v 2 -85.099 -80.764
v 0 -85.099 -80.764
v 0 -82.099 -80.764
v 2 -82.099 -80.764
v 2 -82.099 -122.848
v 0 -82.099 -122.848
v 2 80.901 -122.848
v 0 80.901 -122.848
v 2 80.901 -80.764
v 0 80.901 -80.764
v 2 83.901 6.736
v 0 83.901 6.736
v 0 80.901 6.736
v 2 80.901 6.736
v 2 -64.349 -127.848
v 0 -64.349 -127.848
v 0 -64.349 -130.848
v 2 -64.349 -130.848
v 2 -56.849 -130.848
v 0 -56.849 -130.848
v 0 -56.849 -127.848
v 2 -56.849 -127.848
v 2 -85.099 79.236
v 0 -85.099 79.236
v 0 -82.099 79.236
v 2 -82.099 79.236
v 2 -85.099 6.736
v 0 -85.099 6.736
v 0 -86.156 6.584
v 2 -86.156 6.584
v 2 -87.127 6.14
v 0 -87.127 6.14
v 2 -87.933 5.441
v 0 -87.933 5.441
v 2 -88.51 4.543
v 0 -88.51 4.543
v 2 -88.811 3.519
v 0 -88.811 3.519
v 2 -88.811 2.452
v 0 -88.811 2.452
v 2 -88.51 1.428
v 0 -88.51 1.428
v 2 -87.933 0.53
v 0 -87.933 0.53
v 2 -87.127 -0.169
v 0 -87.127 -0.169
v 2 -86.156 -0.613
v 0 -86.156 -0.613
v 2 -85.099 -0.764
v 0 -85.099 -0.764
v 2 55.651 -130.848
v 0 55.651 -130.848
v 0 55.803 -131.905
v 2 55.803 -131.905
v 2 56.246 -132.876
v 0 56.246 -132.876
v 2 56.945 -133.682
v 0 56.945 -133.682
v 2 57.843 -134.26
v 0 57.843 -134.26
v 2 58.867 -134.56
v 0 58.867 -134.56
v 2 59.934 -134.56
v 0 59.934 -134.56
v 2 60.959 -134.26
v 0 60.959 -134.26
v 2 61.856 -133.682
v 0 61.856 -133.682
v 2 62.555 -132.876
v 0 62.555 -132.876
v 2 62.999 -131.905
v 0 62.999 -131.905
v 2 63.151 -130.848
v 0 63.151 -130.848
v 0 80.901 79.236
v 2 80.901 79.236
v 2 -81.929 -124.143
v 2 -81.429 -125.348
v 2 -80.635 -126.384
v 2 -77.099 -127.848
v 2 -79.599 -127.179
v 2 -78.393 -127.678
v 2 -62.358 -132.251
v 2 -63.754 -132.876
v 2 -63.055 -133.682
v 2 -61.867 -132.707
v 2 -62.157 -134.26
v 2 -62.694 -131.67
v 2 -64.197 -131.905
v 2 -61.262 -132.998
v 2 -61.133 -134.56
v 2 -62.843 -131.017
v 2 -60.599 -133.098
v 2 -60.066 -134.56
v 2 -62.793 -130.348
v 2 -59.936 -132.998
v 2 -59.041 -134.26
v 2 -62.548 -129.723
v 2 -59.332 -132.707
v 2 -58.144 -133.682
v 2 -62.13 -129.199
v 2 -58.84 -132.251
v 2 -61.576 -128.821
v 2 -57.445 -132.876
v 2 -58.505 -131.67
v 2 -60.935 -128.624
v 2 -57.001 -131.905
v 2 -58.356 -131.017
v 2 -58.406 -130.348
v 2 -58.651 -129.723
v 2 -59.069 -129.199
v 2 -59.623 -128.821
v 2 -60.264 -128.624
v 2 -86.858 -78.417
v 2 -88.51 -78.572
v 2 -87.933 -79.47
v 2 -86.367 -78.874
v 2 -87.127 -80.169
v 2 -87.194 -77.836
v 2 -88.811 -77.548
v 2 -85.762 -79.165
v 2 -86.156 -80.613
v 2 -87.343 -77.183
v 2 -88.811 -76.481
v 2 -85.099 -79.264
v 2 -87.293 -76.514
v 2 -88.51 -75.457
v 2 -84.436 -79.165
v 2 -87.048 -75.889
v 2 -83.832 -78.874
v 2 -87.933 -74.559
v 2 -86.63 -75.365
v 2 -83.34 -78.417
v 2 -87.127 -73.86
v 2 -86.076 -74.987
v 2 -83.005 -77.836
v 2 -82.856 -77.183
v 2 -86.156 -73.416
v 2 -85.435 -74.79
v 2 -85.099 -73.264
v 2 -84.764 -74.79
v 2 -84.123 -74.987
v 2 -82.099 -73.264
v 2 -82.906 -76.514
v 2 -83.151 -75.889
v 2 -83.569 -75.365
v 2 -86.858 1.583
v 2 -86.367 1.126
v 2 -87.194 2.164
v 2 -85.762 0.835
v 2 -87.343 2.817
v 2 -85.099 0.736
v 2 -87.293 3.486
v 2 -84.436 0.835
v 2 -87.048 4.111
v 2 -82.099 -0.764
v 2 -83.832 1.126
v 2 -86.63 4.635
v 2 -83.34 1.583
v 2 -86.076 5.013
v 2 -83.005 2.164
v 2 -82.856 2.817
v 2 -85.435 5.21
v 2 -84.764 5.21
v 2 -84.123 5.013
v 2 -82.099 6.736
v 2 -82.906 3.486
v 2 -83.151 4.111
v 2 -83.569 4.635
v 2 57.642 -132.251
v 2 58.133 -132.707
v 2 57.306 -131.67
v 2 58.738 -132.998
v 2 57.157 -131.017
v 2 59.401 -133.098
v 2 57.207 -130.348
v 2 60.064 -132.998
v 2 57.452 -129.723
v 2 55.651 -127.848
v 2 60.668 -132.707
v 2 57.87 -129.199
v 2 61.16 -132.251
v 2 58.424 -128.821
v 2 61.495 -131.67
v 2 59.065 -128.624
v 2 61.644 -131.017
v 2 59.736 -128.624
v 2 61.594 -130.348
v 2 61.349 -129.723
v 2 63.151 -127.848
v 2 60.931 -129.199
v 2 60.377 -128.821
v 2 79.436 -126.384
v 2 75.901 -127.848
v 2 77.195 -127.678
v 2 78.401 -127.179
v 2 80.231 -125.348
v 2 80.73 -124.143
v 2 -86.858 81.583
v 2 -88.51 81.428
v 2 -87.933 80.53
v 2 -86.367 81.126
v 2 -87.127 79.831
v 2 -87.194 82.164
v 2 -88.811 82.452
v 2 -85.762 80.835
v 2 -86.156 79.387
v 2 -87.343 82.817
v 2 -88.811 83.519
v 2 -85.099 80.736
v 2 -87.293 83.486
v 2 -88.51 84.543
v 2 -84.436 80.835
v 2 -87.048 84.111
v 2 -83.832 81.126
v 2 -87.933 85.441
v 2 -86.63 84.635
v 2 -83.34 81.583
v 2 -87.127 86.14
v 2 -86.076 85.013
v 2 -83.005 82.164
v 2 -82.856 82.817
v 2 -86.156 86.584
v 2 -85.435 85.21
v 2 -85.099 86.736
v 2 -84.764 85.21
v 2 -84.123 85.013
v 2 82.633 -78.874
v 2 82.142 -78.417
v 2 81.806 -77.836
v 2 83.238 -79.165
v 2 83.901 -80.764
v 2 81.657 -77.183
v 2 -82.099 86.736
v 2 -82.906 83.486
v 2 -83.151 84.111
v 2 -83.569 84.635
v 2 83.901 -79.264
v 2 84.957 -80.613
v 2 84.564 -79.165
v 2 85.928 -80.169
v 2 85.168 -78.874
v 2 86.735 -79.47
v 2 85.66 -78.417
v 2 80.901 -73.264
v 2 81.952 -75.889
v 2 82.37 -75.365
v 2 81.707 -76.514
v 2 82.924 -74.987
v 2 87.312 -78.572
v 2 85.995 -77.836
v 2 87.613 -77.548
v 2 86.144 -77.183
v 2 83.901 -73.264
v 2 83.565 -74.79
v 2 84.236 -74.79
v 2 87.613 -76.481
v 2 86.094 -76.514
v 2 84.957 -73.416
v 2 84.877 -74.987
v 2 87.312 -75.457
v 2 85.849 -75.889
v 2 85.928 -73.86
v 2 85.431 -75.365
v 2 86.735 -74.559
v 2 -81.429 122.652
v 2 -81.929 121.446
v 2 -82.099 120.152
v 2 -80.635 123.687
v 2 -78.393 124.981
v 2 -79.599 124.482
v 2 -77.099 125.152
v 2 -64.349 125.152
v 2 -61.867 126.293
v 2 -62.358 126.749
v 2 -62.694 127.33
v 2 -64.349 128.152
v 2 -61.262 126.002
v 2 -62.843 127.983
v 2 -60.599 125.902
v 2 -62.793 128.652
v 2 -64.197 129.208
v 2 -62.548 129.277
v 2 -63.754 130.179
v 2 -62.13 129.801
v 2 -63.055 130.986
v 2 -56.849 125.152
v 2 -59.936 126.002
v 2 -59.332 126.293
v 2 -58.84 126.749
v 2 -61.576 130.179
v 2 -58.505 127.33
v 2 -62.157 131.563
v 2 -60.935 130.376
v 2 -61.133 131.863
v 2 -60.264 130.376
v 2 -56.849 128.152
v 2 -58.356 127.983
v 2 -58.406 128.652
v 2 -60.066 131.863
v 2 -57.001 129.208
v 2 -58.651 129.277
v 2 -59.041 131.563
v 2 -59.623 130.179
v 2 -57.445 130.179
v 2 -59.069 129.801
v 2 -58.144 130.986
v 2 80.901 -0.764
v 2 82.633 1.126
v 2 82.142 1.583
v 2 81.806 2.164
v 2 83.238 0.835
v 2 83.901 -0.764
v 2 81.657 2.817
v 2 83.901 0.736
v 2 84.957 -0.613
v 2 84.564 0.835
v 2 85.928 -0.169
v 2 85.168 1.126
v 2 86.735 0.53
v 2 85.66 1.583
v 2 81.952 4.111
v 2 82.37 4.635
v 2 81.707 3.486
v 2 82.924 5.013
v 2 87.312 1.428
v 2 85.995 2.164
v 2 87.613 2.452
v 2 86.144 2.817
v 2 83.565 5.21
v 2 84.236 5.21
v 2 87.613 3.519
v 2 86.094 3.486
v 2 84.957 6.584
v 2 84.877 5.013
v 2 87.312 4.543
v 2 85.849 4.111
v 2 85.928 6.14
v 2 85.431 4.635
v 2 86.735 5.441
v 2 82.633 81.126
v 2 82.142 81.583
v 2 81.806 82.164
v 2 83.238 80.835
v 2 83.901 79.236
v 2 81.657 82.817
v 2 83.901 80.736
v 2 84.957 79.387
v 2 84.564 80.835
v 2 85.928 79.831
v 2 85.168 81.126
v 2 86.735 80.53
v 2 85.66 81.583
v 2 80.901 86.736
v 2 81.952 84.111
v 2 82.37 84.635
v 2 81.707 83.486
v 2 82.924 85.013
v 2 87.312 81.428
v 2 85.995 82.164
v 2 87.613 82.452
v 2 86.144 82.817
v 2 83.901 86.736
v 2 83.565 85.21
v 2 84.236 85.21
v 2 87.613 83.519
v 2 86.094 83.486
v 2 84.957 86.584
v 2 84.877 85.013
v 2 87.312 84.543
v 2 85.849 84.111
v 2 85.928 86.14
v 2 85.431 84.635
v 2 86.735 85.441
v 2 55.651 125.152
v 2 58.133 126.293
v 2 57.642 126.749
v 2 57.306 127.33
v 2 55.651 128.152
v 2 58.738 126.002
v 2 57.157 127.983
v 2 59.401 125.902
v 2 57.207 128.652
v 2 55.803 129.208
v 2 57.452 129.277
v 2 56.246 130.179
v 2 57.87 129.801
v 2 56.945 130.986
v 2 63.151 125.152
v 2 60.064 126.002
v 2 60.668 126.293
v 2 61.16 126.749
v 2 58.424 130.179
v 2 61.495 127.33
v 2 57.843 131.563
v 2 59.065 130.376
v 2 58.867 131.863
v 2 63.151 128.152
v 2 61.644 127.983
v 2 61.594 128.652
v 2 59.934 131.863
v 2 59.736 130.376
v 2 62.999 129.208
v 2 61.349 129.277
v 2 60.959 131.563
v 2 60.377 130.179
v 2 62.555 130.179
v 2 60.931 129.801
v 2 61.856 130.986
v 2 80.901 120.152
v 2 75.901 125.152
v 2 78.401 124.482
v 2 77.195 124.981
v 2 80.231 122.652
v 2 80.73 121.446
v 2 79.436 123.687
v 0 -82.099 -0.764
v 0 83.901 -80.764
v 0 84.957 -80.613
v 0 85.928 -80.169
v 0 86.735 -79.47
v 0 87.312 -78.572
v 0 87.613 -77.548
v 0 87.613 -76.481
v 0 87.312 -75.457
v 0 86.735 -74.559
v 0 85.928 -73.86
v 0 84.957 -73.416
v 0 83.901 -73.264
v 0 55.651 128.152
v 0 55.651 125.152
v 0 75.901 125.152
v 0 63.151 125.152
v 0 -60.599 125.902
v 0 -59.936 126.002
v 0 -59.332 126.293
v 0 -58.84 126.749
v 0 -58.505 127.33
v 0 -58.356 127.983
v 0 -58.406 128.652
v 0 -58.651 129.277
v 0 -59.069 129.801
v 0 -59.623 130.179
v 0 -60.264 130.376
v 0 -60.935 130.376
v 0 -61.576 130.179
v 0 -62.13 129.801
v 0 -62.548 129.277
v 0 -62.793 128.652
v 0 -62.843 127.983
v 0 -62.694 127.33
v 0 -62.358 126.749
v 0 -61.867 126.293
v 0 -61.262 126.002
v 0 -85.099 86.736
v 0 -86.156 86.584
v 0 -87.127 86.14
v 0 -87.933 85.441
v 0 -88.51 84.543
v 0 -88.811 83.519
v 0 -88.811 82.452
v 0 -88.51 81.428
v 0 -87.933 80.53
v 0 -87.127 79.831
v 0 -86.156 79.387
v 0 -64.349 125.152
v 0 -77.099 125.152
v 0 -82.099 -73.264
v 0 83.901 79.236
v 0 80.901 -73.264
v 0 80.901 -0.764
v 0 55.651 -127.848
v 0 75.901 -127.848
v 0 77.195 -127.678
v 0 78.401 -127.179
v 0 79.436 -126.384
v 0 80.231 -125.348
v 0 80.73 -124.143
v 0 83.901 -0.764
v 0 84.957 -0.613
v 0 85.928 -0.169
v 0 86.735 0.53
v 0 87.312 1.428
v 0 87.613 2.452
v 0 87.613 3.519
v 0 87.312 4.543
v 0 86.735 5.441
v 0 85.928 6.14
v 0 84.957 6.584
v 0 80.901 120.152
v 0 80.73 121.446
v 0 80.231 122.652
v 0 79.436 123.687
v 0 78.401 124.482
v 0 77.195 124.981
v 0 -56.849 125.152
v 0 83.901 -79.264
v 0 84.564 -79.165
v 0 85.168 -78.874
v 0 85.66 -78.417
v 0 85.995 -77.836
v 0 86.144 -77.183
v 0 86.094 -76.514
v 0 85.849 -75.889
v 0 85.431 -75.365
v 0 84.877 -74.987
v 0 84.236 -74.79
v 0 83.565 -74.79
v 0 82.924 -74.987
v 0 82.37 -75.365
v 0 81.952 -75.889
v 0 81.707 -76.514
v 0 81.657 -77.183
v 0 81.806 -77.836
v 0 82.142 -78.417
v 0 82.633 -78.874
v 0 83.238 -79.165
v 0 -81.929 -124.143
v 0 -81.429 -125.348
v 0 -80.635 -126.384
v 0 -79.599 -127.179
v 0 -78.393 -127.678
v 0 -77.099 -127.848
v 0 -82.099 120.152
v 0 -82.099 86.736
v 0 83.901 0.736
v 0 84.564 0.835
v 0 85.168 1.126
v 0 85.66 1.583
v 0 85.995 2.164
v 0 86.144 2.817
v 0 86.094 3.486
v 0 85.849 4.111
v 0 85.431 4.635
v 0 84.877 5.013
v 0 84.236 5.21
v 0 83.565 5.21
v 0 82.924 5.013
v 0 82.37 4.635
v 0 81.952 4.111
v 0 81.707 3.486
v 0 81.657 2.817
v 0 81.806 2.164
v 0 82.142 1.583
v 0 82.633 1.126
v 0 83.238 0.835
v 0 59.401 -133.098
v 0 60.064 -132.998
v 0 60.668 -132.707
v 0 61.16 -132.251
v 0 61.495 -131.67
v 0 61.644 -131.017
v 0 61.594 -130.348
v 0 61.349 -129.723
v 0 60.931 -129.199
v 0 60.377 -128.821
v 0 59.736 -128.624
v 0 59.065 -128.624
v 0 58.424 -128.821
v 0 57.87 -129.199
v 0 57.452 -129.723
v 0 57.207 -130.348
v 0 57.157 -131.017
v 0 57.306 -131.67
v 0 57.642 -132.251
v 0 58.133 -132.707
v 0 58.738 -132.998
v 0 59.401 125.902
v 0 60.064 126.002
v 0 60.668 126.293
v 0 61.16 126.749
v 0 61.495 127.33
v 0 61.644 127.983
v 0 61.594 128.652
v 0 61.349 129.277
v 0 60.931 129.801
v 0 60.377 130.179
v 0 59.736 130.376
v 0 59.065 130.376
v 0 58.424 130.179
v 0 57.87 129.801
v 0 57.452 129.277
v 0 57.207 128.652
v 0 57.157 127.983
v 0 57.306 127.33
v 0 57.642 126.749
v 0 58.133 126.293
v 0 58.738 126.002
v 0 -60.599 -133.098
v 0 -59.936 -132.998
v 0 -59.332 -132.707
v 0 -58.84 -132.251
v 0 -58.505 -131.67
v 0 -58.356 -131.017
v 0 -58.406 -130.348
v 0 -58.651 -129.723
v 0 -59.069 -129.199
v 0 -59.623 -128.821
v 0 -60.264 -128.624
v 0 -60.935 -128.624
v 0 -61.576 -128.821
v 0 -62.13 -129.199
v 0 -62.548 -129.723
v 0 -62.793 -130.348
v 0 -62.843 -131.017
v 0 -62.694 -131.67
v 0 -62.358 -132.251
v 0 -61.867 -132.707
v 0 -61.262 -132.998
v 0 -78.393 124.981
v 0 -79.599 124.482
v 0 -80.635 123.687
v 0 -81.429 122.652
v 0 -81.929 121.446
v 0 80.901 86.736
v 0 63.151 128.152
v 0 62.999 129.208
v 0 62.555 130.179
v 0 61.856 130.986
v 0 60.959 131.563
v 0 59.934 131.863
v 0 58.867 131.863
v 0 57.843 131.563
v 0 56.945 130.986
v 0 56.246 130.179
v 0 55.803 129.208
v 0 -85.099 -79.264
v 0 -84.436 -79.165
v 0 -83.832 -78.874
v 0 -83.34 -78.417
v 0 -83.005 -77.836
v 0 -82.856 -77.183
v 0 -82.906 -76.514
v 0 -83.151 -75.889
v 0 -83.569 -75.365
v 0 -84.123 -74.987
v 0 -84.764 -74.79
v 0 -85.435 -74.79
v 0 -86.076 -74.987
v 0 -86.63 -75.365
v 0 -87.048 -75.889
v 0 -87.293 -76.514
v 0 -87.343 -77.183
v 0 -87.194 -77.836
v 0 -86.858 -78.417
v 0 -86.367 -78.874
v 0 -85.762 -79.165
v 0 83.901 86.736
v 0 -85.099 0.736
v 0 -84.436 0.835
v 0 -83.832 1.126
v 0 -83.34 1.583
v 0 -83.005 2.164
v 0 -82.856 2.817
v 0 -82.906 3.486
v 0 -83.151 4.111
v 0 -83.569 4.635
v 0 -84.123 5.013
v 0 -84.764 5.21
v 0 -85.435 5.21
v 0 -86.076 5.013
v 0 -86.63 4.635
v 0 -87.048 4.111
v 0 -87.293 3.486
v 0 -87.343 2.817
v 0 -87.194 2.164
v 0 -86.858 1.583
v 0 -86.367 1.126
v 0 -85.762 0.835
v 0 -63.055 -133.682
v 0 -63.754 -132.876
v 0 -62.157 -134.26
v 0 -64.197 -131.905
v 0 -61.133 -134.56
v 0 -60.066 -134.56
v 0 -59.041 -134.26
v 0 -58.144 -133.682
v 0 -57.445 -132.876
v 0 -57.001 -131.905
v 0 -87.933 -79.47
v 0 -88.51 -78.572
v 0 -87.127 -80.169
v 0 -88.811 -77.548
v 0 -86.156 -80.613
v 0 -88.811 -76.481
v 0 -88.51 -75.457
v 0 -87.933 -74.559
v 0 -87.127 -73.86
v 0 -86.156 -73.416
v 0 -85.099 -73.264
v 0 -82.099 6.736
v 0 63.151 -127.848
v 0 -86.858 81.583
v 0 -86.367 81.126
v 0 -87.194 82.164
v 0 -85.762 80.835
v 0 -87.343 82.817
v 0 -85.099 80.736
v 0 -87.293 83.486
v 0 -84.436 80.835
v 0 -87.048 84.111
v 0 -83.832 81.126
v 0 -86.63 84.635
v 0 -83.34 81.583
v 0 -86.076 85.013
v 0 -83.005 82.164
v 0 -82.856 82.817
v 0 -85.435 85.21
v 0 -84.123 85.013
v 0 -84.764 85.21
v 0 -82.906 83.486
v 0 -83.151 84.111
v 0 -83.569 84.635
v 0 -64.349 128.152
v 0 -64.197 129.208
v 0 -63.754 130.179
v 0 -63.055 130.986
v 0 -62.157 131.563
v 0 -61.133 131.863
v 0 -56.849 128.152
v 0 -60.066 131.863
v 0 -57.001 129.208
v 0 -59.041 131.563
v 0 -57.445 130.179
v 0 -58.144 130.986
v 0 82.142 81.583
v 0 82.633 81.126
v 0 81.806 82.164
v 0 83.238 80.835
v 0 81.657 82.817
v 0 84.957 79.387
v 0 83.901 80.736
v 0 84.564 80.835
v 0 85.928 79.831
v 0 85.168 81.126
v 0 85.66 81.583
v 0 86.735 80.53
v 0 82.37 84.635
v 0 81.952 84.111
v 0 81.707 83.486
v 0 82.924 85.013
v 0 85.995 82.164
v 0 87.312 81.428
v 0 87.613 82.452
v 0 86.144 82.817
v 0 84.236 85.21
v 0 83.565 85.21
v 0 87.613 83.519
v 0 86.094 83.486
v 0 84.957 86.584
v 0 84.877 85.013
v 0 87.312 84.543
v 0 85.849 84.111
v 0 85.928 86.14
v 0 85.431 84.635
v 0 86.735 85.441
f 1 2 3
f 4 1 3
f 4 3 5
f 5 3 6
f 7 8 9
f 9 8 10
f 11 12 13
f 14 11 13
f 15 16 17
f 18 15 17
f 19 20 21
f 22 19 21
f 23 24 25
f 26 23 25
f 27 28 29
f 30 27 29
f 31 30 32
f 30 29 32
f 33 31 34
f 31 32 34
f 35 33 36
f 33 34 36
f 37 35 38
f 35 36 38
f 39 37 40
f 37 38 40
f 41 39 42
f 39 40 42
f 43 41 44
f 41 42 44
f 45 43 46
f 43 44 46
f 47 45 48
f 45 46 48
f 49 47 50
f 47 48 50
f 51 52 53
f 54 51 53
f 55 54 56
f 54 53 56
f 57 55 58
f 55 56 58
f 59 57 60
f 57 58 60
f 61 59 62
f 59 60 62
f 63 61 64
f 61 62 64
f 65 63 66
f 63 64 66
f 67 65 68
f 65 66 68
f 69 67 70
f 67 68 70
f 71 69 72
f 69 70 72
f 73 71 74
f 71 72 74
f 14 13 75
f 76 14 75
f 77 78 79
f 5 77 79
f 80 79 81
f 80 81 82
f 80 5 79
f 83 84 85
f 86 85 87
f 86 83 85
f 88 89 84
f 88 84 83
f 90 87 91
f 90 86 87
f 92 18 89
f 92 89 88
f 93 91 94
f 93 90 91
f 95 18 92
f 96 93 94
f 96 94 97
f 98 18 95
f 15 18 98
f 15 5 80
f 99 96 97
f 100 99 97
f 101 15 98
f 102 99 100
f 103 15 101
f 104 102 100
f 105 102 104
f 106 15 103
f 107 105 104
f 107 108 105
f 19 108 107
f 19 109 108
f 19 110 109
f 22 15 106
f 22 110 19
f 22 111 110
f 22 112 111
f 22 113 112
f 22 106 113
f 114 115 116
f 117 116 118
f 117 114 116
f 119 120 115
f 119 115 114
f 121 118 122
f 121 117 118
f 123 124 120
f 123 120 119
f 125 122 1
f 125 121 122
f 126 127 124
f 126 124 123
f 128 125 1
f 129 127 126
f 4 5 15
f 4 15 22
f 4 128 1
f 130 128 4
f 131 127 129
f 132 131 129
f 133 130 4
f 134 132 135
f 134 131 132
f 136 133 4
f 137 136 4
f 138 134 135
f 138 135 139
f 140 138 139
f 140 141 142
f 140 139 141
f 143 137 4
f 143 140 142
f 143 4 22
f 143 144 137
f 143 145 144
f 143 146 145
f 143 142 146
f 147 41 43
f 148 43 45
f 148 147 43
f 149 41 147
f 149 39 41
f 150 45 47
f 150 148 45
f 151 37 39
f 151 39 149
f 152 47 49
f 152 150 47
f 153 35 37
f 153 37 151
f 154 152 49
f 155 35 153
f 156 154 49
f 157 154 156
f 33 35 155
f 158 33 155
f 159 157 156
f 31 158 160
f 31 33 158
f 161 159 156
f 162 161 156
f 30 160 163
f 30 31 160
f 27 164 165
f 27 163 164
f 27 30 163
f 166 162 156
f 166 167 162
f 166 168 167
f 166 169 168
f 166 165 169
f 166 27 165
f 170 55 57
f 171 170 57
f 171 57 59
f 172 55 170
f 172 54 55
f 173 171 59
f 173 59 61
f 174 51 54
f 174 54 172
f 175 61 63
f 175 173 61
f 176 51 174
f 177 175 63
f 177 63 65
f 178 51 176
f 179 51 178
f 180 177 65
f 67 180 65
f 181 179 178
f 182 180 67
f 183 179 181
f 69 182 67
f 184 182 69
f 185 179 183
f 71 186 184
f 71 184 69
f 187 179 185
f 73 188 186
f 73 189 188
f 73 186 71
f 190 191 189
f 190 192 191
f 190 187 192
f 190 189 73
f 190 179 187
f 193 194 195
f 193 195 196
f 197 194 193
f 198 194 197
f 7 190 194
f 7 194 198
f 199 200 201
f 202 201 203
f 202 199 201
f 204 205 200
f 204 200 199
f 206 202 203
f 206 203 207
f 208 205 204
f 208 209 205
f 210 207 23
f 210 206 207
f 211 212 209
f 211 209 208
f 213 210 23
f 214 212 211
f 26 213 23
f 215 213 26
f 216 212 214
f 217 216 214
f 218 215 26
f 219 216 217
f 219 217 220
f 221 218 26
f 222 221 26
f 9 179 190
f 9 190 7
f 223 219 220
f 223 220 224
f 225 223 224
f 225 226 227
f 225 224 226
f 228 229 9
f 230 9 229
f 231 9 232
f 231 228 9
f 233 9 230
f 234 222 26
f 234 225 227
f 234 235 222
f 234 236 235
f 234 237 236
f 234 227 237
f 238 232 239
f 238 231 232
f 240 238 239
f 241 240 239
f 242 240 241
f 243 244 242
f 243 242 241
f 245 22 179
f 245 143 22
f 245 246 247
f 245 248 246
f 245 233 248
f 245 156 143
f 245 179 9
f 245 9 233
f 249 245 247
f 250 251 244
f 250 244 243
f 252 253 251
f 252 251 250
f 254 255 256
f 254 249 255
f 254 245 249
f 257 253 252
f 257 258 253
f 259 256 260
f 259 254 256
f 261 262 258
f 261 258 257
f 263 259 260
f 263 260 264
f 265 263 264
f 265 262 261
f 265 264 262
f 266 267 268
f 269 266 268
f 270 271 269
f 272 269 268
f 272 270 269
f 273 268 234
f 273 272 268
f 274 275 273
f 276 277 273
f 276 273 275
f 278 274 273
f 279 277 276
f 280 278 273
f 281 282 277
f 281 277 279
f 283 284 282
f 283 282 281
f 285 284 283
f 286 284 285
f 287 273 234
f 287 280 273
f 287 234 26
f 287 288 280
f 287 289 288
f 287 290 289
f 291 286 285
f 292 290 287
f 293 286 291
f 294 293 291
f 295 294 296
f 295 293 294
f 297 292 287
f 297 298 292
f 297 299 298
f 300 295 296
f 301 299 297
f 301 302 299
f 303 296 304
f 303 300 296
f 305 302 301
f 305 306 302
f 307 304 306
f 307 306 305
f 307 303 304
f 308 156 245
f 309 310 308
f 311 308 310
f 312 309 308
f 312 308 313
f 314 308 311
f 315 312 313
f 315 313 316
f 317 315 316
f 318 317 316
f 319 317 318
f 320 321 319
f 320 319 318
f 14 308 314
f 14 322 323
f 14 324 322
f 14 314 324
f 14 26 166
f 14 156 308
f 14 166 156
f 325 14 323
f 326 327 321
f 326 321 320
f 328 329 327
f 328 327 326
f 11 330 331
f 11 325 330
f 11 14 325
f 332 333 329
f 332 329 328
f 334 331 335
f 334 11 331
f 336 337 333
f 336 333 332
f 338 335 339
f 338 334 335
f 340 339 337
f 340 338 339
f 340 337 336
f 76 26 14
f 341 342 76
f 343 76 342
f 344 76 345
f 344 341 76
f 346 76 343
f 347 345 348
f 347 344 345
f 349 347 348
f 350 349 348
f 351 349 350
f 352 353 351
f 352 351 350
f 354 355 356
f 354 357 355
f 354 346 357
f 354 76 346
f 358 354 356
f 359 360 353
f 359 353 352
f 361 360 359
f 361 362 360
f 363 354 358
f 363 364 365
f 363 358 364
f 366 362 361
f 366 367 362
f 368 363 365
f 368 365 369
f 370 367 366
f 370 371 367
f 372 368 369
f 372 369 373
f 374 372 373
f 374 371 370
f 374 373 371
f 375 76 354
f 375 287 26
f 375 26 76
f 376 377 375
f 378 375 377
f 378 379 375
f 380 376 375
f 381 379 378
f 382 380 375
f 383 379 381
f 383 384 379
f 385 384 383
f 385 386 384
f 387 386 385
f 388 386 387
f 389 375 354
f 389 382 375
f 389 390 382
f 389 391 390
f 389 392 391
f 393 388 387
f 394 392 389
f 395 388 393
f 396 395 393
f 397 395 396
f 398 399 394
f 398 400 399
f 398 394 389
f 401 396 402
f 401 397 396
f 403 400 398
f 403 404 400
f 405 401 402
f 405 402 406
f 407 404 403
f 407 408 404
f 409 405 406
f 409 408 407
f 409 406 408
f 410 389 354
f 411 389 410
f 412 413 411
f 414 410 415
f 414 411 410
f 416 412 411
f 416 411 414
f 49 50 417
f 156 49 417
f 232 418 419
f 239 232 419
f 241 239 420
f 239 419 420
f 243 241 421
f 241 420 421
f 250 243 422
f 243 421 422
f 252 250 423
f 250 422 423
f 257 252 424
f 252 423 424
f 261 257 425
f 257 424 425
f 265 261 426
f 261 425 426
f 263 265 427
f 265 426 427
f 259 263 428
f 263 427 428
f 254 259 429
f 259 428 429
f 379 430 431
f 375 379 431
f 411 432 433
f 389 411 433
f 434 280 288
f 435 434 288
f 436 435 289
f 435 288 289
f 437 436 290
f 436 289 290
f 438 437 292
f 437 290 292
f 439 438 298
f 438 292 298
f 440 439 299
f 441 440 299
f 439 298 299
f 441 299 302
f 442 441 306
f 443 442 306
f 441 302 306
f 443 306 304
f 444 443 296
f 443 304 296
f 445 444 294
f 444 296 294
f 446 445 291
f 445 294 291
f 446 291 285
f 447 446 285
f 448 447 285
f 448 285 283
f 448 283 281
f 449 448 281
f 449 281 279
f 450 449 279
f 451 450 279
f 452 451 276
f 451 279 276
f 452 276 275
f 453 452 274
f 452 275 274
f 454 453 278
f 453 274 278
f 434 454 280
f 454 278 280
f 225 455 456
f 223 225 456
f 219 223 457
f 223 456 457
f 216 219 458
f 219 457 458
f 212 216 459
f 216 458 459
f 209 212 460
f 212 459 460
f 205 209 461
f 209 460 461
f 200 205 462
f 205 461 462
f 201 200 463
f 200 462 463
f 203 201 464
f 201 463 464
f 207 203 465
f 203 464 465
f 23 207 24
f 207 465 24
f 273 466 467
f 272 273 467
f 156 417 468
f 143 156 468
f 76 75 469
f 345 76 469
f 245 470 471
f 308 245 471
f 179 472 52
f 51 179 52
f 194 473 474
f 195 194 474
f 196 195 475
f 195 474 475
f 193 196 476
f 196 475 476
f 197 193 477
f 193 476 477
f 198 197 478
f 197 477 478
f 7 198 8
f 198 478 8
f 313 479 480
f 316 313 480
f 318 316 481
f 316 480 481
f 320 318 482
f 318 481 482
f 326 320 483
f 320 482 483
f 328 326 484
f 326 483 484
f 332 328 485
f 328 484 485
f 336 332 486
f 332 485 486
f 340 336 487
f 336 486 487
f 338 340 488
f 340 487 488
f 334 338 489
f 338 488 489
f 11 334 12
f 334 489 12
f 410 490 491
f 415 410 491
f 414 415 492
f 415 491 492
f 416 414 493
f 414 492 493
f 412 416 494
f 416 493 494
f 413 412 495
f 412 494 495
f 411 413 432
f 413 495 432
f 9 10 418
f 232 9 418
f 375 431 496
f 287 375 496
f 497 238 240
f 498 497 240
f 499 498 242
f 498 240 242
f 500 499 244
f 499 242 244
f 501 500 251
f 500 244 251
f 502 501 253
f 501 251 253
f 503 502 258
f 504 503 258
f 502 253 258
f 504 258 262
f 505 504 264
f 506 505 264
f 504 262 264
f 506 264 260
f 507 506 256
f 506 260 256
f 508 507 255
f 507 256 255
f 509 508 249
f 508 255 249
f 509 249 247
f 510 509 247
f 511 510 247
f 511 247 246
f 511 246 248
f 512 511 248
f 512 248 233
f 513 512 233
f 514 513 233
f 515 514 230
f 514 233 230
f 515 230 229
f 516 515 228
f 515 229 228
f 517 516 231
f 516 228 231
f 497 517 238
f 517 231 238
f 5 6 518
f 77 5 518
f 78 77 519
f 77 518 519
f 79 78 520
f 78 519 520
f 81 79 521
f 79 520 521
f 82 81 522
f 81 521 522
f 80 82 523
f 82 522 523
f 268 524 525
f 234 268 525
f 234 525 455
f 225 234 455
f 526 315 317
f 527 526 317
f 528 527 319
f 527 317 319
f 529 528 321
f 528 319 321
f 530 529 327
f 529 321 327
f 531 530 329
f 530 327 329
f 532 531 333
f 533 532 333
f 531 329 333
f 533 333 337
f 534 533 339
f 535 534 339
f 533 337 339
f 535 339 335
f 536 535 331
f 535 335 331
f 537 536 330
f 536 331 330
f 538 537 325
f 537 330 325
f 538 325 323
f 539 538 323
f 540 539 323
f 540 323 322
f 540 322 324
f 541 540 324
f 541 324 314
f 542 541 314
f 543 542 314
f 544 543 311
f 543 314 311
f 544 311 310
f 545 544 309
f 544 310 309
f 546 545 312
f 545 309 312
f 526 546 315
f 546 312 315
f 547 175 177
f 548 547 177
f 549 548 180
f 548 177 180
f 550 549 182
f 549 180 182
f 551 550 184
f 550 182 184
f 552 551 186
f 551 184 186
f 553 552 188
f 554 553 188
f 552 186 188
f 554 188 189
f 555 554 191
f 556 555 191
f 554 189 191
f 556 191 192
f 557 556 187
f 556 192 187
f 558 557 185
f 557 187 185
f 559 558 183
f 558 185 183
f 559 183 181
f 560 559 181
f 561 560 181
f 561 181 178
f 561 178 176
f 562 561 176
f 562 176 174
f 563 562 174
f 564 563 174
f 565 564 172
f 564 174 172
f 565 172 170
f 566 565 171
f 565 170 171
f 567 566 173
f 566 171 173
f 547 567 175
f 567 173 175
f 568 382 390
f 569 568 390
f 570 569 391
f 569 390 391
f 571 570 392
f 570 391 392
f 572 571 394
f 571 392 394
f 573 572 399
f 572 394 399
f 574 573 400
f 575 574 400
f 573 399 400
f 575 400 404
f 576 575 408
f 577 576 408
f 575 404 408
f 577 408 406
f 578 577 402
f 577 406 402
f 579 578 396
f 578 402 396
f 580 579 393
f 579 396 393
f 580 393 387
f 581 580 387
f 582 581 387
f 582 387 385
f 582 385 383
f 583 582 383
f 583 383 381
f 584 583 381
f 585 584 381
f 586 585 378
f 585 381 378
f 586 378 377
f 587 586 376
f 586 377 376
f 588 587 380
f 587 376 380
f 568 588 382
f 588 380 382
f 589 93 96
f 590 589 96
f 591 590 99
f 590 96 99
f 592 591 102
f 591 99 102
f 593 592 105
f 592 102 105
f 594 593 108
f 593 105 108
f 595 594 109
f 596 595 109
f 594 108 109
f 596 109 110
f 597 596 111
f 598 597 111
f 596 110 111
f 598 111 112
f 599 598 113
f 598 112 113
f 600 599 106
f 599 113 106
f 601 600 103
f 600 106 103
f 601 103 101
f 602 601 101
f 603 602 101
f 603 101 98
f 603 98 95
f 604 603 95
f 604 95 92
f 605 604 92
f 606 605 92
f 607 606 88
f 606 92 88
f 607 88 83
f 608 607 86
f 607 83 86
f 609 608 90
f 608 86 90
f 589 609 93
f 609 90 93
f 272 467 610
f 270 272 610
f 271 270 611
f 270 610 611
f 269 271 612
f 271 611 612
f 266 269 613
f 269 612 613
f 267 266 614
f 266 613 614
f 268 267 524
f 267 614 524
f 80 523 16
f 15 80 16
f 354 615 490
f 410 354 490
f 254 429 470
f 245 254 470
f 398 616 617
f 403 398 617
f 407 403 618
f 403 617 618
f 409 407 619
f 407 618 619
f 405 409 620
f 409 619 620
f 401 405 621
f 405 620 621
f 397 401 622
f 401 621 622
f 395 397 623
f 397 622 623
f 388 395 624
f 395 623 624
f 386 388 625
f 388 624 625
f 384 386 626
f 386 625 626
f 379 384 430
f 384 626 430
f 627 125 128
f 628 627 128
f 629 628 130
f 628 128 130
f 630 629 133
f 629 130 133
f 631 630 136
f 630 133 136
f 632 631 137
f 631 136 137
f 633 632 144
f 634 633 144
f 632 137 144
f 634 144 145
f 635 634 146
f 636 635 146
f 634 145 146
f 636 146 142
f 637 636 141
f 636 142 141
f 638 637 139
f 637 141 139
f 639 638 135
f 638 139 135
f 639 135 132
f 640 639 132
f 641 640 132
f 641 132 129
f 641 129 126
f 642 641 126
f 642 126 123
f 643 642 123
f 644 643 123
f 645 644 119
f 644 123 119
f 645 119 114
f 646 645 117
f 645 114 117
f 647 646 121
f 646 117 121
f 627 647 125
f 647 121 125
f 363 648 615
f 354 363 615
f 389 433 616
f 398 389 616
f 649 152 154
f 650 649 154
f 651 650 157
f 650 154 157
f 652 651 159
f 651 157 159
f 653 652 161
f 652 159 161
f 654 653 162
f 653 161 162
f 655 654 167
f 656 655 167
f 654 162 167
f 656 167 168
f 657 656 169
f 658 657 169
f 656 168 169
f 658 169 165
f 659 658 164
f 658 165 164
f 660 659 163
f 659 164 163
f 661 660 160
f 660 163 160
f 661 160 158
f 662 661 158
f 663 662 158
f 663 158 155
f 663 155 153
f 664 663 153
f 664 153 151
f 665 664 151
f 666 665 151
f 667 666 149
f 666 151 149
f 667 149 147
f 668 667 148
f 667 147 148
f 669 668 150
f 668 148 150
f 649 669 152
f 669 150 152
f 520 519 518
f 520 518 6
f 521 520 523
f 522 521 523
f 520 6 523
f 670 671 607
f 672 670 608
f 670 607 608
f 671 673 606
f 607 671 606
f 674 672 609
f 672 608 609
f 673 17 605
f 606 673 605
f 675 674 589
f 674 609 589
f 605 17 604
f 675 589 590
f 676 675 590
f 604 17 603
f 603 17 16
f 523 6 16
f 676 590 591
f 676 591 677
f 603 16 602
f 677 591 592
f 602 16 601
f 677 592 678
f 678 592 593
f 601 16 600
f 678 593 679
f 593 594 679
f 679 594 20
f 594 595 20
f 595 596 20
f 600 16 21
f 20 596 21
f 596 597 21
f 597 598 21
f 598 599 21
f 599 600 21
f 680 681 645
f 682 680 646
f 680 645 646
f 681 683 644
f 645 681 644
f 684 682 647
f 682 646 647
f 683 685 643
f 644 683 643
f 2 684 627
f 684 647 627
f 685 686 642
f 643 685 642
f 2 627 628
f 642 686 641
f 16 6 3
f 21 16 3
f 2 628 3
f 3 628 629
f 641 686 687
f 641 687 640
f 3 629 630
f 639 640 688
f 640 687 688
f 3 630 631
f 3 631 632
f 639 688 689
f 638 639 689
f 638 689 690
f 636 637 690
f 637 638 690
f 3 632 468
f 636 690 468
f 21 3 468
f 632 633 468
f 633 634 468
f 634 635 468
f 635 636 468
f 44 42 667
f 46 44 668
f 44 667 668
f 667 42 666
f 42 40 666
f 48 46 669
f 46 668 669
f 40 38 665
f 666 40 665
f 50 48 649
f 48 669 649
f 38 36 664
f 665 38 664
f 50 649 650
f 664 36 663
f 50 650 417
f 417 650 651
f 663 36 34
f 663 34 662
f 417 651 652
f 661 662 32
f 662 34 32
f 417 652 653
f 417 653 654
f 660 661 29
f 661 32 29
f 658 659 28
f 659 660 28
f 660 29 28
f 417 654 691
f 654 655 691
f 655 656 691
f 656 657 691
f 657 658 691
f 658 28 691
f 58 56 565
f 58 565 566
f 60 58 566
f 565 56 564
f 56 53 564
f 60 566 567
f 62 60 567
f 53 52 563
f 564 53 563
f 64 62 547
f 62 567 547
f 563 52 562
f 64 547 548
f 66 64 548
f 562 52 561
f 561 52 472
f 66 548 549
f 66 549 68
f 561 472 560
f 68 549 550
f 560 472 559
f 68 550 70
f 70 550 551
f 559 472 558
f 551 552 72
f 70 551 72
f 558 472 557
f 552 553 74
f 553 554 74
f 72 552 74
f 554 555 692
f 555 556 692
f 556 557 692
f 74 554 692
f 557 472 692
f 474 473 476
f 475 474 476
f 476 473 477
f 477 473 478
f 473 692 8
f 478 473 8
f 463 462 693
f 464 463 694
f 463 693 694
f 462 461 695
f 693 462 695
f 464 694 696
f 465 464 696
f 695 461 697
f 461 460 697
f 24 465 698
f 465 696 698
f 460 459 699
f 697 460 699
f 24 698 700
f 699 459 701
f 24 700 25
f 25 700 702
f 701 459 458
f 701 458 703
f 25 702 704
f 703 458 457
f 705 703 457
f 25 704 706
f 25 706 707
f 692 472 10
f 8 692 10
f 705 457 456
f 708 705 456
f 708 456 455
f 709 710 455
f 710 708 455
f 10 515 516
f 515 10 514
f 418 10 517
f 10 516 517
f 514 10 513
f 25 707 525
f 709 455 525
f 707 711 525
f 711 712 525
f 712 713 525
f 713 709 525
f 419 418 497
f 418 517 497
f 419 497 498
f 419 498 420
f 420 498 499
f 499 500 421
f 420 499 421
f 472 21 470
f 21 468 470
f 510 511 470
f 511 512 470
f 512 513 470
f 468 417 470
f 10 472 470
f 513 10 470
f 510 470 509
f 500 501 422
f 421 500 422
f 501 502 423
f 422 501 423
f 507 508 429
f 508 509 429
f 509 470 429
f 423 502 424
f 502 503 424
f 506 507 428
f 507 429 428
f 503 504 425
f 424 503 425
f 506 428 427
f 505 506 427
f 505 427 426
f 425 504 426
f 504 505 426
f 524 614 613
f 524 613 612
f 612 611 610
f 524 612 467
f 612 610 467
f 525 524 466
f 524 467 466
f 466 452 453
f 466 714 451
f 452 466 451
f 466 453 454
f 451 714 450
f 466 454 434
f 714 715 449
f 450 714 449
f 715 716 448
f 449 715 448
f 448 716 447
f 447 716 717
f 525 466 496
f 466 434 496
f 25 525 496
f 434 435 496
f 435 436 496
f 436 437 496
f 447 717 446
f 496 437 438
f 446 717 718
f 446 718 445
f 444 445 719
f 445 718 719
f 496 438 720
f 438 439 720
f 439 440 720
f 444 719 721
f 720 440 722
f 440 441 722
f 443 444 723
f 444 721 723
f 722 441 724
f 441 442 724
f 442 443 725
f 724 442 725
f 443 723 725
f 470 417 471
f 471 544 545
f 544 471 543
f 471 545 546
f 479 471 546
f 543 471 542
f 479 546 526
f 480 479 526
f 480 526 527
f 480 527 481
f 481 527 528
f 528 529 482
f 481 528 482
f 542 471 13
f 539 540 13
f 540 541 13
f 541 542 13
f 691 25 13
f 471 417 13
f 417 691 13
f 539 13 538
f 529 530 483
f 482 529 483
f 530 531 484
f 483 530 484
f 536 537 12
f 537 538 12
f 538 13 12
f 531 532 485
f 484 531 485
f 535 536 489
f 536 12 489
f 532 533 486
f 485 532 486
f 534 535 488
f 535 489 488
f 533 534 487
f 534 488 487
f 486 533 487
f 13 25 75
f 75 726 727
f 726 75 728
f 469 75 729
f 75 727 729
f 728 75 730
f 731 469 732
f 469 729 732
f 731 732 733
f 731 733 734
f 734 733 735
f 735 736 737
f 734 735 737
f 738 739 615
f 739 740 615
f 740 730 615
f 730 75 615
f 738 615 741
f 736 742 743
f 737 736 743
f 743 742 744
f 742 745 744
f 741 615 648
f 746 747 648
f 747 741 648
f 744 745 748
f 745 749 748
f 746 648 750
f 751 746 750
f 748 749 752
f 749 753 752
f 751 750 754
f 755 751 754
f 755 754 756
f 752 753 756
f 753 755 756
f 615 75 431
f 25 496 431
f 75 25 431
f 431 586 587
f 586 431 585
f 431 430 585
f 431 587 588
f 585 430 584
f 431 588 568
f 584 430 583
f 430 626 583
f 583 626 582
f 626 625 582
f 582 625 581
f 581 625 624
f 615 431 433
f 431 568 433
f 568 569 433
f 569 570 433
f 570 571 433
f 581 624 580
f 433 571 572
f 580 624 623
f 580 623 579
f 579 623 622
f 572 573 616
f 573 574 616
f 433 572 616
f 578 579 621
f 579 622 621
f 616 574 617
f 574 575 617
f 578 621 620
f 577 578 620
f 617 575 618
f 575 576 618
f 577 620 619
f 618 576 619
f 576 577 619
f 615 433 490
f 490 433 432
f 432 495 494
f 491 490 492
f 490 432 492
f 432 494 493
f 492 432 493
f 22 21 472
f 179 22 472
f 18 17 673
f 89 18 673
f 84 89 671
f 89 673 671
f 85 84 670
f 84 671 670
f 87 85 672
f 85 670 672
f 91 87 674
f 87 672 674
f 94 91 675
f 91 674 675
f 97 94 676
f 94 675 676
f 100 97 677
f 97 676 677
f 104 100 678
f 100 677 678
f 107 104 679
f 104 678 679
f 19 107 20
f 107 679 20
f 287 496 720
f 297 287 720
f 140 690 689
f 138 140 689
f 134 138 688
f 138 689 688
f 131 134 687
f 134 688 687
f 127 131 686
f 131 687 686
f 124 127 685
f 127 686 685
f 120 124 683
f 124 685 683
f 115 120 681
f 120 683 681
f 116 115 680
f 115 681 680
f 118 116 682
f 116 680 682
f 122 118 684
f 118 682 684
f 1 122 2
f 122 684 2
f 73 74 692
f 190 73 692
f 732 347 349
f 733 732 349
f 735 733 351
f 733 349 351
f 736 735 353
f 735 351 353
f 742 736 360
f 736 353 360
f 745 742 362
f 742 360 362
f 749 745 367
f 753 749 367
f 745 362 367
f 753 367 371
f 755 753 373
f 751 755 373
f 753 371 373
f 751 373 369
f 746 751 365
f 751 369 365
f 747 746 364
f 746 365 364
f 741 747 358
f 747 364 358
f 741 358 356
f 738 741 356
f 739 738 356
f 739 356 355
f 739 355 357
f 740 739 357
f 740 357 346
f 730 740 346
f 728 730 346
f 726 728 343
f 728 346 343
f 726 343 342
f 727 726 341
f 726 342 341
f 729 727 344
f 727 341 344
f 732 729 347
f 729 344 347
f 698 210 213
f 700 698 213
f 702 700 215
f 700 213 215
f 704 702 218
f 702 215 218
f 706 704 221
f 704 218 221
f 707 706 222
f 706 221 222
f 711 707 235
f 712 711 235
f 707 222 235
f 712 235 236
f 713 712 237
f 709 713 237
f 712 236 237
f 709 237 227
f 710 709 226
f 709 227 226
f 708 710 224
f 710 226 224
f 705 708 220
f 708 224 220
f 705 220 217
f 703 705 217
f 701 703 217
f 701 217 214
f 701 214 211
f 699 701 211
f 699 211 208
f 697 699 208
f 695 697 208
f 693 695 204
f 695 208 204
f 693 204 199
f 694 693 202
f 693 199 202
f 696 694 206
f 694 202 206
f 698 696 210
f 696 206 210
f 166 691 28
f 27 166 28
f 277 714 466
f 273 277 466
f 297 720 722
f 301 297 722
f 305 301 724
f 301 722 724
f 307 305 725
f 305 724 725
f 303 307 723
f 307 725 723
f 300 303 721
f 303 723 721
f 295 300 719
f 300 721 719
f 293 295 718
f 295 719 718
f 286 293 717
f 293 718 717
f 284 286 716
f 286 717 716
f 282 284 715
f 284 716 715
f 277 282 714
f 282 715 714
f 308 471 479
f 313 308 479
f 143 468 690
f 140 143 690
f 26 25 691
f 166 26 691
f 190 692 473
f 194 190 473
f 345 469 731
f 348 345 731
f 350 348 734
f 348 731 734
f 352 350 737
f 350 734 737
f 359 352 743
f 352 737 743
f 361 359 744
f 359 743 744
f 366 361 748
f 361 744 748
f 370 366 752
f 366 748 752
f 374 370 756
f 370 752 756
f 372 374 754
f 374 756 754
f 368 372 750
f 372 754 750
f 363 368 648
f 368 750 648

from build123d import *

# Parameters (mm, degrees)
IZIM2_R                     = 1.6
Y_KSEKLIK_EKSTR_ZYON1_DEPTH = 2
IZIM3_R                     = 2.25
KES_EKSTR_ZYON1_DEPTH       = 2


with BuildPart() as part:
    # Çizim2 → Yükseklik-Ekstrüzyon1 (new body)
    with BuildSketch(Plane.YZ):
        with BuildLine():
            Line((-77.099299539, -127.848423963), (-64.349299539, -127.848423963))
            Line((-64.349299539, -127.848423963), (-64.349299539, -130.848423963))
            ThreePointArc((-64.349299539, -130.848423963), (-60.599299539, -134.598423963), (-56.849299539, -130.848423963))
            Line((-56.849299539, -130.848423963), (-56.849299539, -127.848423963))
            Line((-56.849299539, -127.848423963), (55.650700461, -127.848423963))
            Line((55.650700461, -127.848423963), (55.650700461, -130.848423963))
            ThreePointArc((55.650700461, -130.848423963), (59.400700461, -134.598423963), (63.150700461, -130.848423963))
            Line((63.150700461, -130.848423963), (63.150700461, -127.848423963))
            Line((63.150700461, -127.848423963), (75.900700461, -127.848423963))
            ThreePointArc((75.900700461, -127.848423963), (79.436234367, -126.383957869), (80.900700461, -122.848423963))
            Line((80.900700461, -122.848423963), (80.900700461, -80.764464123))
            Line((80.900700461, -80.764464123), (83.900700461, -80.764464123))
            ThreePointArc((83.900700461, -80.764464123), (87.650700461, -77.014464123), (83.900700461, -73.264464123))
            Line((83.900700461, -73.264464123), (80.900700461, -73.264464123))
            Line((80.900700461, -73.264464123), (80.900700461, -0.764464123))
            Line((80.900700461, -0.764464123), (83.900700461, -0.764464123))
            ThreePointArc((83.900700461, -0.764464123), (87.650700461, 2.985535877), (83.900700461, 6.735535877))
            Line((83.900700461, 6.735535877), (80.900700461, 6.735535877))
            Line((80.900700461, 6.735535877), (80.900700461, 79.235535877))
            Line((80.900700461, 79.235535877), (83.900700461, 79.235535877))
            ThreePointArc((83.900700461, 79.235535877), (87.650700461, 82.985535877), (83.900700461, 86.735535877))
            Line((83.900700461, 86.735535877), (80.900700461, 86.735535877))
            Line((80.900700461, 86.735535877), (80.900700461, 120.151576037))
            ThreePointArc((80.900700461, 120.151576037), (79.436234367, 123.687109943), (75.900700461, 125.151576037))
            Line((75.900700461, 125.151576037), (63.150700461, 125.151576037))
            Line((63.150700461, 125.151576037), (63.150700461, 128.151576037))
            ThreePointArc((63.150700461, 128.151576037), (59.400700461, 131.901576037), (55.650700461, 128.151576037))
            Line((55.650700461, 128.151576037), (55.650700461, 125.151576037))
            Line((55.650700461, 125.151576037), (-56.849299539, 125.151576037))
            Line((-56.849299539, 125.151576037), (-56.849299539, 128.151576037))
            ThreePointArc((-56.849299539, 128.151576037), (-60.599299539, 131.901576037), (-64.349299539, 128.151576037))
            Line((-64.349299539, 128.151576037), (-64.349299539, 125.151576037))
            Line((-64.349299539, 125.151576037), (-77.099299539, 125.151576037))
            ThreePointArc((-77.099299539, 125.151576037), (-80.634833445, 123.687109943), (-82.099299539, 120.151576037))
            Line((-82.099299539, 120.151576037), (-82.099299539, 86.735535877))
            Line((-82.099299539, 86.735535877), (-85.099299539, 86.735535877))
            ThreePointArc((-85.099299539, 86.735535877), (-88.849299539, 82.985535877), (-85.099299539, 79.235535877))
            Line((-85.099299539, 79.235535877), (-82.099299539, 79.235535877))
            Line((-82.099299539, 79.235535877), (-82.099299539, 6.735535877))
            Line((-82.099299539, 6.735535877), (-85.099299539, 6.735535877))
            ThreePointArc((-85.099299539, 6.735535877), (-88.849299539, 2.985535877), (-85.099299539, -0.764464123))
            Line((-85.099299539, -0.764464123), (-82.099299539, -0.764464123))
            Line((-82.099299539, -0.764464123), (-82.099299539, -73.264464123))
            Line((-82.099299539, -73.264464123), (-85.099299539, -73.264464123))
            ThreePointArc((-85.099299539, -73.264464123), (-88.849299539, -77.014464123), (-85.099299539, -80.764464123))
            Line((-85.099299539, -80.764464123), (-82.099299539, -80.764464123))
            Line((-82.099299539, -80.764464123), (-82.099299539, -122.848423963))
            ThreePointArc((-82.099299539, -122.848423963), (-80.634833445, -126.383957869), (-77.099299539, -127.848423963))
        make_face()
        with Locations(Location((-85.099299539, 82.985535877, 0), (0, 0, 270))):
            Circle(IZIM2_R, mode=Mode.SUBTRACT)
        with Locations(Location((-85.099299539, 2.985535877, 0), (0, 0, 270))):
            Circle(IZIM2_R, mode=Mode.SUBTRACT)
        with Locations(Location((-85.099299539, -77.014464123, 0), (0, 0, 270))):
            Circle(IZIM2_R, mode=Mode.SUBTRACT)
        with Locations(Location((-60.599299539, -130.848423963, 0), (0, 0, 270))):
            Circle(IZIM2_R, mode=Mode.SUBTRACT)
        with Locations(Location((59.400700461, -130.848423963, 0), (0, 0, 270))):
            Circle(IZIM2_R, mode=Mode.SUBTRACT)
        with Locations(Location((83.900700461, -77.014464123, 0), (0, 0, 270))):
            Circle(IZIM2_R, mode=Mode.SUBTRACT)
        with Locations(Location((83.900700461, 2.985535877, 0), (0, 0, 270))):
            Circle(IZIM2_R, mode=Mode.SUBTRACT)
        with Locations(Location((83.900700461, 82.985535877, 0), (0, 0, 270))):
            Circle(IZIM2_R, mode=Mode.SUBTRACT)
        with Locations(Location((59.400700461, 128.151576037, 0), (0, 0, 270))):
            Circle(IZIM2_R, mode=Mode.SUBTRACT)
        with Locations(Location((-60.599299539, 128.151576037, 0), (0, 0, 270))):
            Circle(IZIM2_R, mode=Mode.SUBTRACT)
    extrude(amount=Y_KSEKLIK_EKSTR_ZYON1_DEPTH)

    # Çizim3 → Kes-Ekstrüzyon1 (cut)
    with BuildSketch(Plane.YZ.offset(2)):
        with Locations(Location((-60.599299539, 128.151576037, 0), (0, 0, 270))):
            Circle(IZIM3_R)
    kes_ekstr_zyon1 = extrude(amount=-KES_EKSTR_ZYON1_DEPTH, mode=Mode.SUBTRACT)

    # Çizim-Çoğaltma1: Kes-Ekstrüzyon1 at 10 more places
    with Locations((0, 120, 0), (0, 144.5, -45.16604), (0, 144.5, -125.16604), (0, 144.5, -205.16604), (0, 120, -259), (0, 0, -259), (0, -24.5, -205.16604), (0, -24.5, -125.16604), (0, -24.5, -45.16604), (0, -147.335631, 64.588173)):
        add(kes_ekstr_zyon1, mode=Mode.SUBTRACT)


solid = part.part
